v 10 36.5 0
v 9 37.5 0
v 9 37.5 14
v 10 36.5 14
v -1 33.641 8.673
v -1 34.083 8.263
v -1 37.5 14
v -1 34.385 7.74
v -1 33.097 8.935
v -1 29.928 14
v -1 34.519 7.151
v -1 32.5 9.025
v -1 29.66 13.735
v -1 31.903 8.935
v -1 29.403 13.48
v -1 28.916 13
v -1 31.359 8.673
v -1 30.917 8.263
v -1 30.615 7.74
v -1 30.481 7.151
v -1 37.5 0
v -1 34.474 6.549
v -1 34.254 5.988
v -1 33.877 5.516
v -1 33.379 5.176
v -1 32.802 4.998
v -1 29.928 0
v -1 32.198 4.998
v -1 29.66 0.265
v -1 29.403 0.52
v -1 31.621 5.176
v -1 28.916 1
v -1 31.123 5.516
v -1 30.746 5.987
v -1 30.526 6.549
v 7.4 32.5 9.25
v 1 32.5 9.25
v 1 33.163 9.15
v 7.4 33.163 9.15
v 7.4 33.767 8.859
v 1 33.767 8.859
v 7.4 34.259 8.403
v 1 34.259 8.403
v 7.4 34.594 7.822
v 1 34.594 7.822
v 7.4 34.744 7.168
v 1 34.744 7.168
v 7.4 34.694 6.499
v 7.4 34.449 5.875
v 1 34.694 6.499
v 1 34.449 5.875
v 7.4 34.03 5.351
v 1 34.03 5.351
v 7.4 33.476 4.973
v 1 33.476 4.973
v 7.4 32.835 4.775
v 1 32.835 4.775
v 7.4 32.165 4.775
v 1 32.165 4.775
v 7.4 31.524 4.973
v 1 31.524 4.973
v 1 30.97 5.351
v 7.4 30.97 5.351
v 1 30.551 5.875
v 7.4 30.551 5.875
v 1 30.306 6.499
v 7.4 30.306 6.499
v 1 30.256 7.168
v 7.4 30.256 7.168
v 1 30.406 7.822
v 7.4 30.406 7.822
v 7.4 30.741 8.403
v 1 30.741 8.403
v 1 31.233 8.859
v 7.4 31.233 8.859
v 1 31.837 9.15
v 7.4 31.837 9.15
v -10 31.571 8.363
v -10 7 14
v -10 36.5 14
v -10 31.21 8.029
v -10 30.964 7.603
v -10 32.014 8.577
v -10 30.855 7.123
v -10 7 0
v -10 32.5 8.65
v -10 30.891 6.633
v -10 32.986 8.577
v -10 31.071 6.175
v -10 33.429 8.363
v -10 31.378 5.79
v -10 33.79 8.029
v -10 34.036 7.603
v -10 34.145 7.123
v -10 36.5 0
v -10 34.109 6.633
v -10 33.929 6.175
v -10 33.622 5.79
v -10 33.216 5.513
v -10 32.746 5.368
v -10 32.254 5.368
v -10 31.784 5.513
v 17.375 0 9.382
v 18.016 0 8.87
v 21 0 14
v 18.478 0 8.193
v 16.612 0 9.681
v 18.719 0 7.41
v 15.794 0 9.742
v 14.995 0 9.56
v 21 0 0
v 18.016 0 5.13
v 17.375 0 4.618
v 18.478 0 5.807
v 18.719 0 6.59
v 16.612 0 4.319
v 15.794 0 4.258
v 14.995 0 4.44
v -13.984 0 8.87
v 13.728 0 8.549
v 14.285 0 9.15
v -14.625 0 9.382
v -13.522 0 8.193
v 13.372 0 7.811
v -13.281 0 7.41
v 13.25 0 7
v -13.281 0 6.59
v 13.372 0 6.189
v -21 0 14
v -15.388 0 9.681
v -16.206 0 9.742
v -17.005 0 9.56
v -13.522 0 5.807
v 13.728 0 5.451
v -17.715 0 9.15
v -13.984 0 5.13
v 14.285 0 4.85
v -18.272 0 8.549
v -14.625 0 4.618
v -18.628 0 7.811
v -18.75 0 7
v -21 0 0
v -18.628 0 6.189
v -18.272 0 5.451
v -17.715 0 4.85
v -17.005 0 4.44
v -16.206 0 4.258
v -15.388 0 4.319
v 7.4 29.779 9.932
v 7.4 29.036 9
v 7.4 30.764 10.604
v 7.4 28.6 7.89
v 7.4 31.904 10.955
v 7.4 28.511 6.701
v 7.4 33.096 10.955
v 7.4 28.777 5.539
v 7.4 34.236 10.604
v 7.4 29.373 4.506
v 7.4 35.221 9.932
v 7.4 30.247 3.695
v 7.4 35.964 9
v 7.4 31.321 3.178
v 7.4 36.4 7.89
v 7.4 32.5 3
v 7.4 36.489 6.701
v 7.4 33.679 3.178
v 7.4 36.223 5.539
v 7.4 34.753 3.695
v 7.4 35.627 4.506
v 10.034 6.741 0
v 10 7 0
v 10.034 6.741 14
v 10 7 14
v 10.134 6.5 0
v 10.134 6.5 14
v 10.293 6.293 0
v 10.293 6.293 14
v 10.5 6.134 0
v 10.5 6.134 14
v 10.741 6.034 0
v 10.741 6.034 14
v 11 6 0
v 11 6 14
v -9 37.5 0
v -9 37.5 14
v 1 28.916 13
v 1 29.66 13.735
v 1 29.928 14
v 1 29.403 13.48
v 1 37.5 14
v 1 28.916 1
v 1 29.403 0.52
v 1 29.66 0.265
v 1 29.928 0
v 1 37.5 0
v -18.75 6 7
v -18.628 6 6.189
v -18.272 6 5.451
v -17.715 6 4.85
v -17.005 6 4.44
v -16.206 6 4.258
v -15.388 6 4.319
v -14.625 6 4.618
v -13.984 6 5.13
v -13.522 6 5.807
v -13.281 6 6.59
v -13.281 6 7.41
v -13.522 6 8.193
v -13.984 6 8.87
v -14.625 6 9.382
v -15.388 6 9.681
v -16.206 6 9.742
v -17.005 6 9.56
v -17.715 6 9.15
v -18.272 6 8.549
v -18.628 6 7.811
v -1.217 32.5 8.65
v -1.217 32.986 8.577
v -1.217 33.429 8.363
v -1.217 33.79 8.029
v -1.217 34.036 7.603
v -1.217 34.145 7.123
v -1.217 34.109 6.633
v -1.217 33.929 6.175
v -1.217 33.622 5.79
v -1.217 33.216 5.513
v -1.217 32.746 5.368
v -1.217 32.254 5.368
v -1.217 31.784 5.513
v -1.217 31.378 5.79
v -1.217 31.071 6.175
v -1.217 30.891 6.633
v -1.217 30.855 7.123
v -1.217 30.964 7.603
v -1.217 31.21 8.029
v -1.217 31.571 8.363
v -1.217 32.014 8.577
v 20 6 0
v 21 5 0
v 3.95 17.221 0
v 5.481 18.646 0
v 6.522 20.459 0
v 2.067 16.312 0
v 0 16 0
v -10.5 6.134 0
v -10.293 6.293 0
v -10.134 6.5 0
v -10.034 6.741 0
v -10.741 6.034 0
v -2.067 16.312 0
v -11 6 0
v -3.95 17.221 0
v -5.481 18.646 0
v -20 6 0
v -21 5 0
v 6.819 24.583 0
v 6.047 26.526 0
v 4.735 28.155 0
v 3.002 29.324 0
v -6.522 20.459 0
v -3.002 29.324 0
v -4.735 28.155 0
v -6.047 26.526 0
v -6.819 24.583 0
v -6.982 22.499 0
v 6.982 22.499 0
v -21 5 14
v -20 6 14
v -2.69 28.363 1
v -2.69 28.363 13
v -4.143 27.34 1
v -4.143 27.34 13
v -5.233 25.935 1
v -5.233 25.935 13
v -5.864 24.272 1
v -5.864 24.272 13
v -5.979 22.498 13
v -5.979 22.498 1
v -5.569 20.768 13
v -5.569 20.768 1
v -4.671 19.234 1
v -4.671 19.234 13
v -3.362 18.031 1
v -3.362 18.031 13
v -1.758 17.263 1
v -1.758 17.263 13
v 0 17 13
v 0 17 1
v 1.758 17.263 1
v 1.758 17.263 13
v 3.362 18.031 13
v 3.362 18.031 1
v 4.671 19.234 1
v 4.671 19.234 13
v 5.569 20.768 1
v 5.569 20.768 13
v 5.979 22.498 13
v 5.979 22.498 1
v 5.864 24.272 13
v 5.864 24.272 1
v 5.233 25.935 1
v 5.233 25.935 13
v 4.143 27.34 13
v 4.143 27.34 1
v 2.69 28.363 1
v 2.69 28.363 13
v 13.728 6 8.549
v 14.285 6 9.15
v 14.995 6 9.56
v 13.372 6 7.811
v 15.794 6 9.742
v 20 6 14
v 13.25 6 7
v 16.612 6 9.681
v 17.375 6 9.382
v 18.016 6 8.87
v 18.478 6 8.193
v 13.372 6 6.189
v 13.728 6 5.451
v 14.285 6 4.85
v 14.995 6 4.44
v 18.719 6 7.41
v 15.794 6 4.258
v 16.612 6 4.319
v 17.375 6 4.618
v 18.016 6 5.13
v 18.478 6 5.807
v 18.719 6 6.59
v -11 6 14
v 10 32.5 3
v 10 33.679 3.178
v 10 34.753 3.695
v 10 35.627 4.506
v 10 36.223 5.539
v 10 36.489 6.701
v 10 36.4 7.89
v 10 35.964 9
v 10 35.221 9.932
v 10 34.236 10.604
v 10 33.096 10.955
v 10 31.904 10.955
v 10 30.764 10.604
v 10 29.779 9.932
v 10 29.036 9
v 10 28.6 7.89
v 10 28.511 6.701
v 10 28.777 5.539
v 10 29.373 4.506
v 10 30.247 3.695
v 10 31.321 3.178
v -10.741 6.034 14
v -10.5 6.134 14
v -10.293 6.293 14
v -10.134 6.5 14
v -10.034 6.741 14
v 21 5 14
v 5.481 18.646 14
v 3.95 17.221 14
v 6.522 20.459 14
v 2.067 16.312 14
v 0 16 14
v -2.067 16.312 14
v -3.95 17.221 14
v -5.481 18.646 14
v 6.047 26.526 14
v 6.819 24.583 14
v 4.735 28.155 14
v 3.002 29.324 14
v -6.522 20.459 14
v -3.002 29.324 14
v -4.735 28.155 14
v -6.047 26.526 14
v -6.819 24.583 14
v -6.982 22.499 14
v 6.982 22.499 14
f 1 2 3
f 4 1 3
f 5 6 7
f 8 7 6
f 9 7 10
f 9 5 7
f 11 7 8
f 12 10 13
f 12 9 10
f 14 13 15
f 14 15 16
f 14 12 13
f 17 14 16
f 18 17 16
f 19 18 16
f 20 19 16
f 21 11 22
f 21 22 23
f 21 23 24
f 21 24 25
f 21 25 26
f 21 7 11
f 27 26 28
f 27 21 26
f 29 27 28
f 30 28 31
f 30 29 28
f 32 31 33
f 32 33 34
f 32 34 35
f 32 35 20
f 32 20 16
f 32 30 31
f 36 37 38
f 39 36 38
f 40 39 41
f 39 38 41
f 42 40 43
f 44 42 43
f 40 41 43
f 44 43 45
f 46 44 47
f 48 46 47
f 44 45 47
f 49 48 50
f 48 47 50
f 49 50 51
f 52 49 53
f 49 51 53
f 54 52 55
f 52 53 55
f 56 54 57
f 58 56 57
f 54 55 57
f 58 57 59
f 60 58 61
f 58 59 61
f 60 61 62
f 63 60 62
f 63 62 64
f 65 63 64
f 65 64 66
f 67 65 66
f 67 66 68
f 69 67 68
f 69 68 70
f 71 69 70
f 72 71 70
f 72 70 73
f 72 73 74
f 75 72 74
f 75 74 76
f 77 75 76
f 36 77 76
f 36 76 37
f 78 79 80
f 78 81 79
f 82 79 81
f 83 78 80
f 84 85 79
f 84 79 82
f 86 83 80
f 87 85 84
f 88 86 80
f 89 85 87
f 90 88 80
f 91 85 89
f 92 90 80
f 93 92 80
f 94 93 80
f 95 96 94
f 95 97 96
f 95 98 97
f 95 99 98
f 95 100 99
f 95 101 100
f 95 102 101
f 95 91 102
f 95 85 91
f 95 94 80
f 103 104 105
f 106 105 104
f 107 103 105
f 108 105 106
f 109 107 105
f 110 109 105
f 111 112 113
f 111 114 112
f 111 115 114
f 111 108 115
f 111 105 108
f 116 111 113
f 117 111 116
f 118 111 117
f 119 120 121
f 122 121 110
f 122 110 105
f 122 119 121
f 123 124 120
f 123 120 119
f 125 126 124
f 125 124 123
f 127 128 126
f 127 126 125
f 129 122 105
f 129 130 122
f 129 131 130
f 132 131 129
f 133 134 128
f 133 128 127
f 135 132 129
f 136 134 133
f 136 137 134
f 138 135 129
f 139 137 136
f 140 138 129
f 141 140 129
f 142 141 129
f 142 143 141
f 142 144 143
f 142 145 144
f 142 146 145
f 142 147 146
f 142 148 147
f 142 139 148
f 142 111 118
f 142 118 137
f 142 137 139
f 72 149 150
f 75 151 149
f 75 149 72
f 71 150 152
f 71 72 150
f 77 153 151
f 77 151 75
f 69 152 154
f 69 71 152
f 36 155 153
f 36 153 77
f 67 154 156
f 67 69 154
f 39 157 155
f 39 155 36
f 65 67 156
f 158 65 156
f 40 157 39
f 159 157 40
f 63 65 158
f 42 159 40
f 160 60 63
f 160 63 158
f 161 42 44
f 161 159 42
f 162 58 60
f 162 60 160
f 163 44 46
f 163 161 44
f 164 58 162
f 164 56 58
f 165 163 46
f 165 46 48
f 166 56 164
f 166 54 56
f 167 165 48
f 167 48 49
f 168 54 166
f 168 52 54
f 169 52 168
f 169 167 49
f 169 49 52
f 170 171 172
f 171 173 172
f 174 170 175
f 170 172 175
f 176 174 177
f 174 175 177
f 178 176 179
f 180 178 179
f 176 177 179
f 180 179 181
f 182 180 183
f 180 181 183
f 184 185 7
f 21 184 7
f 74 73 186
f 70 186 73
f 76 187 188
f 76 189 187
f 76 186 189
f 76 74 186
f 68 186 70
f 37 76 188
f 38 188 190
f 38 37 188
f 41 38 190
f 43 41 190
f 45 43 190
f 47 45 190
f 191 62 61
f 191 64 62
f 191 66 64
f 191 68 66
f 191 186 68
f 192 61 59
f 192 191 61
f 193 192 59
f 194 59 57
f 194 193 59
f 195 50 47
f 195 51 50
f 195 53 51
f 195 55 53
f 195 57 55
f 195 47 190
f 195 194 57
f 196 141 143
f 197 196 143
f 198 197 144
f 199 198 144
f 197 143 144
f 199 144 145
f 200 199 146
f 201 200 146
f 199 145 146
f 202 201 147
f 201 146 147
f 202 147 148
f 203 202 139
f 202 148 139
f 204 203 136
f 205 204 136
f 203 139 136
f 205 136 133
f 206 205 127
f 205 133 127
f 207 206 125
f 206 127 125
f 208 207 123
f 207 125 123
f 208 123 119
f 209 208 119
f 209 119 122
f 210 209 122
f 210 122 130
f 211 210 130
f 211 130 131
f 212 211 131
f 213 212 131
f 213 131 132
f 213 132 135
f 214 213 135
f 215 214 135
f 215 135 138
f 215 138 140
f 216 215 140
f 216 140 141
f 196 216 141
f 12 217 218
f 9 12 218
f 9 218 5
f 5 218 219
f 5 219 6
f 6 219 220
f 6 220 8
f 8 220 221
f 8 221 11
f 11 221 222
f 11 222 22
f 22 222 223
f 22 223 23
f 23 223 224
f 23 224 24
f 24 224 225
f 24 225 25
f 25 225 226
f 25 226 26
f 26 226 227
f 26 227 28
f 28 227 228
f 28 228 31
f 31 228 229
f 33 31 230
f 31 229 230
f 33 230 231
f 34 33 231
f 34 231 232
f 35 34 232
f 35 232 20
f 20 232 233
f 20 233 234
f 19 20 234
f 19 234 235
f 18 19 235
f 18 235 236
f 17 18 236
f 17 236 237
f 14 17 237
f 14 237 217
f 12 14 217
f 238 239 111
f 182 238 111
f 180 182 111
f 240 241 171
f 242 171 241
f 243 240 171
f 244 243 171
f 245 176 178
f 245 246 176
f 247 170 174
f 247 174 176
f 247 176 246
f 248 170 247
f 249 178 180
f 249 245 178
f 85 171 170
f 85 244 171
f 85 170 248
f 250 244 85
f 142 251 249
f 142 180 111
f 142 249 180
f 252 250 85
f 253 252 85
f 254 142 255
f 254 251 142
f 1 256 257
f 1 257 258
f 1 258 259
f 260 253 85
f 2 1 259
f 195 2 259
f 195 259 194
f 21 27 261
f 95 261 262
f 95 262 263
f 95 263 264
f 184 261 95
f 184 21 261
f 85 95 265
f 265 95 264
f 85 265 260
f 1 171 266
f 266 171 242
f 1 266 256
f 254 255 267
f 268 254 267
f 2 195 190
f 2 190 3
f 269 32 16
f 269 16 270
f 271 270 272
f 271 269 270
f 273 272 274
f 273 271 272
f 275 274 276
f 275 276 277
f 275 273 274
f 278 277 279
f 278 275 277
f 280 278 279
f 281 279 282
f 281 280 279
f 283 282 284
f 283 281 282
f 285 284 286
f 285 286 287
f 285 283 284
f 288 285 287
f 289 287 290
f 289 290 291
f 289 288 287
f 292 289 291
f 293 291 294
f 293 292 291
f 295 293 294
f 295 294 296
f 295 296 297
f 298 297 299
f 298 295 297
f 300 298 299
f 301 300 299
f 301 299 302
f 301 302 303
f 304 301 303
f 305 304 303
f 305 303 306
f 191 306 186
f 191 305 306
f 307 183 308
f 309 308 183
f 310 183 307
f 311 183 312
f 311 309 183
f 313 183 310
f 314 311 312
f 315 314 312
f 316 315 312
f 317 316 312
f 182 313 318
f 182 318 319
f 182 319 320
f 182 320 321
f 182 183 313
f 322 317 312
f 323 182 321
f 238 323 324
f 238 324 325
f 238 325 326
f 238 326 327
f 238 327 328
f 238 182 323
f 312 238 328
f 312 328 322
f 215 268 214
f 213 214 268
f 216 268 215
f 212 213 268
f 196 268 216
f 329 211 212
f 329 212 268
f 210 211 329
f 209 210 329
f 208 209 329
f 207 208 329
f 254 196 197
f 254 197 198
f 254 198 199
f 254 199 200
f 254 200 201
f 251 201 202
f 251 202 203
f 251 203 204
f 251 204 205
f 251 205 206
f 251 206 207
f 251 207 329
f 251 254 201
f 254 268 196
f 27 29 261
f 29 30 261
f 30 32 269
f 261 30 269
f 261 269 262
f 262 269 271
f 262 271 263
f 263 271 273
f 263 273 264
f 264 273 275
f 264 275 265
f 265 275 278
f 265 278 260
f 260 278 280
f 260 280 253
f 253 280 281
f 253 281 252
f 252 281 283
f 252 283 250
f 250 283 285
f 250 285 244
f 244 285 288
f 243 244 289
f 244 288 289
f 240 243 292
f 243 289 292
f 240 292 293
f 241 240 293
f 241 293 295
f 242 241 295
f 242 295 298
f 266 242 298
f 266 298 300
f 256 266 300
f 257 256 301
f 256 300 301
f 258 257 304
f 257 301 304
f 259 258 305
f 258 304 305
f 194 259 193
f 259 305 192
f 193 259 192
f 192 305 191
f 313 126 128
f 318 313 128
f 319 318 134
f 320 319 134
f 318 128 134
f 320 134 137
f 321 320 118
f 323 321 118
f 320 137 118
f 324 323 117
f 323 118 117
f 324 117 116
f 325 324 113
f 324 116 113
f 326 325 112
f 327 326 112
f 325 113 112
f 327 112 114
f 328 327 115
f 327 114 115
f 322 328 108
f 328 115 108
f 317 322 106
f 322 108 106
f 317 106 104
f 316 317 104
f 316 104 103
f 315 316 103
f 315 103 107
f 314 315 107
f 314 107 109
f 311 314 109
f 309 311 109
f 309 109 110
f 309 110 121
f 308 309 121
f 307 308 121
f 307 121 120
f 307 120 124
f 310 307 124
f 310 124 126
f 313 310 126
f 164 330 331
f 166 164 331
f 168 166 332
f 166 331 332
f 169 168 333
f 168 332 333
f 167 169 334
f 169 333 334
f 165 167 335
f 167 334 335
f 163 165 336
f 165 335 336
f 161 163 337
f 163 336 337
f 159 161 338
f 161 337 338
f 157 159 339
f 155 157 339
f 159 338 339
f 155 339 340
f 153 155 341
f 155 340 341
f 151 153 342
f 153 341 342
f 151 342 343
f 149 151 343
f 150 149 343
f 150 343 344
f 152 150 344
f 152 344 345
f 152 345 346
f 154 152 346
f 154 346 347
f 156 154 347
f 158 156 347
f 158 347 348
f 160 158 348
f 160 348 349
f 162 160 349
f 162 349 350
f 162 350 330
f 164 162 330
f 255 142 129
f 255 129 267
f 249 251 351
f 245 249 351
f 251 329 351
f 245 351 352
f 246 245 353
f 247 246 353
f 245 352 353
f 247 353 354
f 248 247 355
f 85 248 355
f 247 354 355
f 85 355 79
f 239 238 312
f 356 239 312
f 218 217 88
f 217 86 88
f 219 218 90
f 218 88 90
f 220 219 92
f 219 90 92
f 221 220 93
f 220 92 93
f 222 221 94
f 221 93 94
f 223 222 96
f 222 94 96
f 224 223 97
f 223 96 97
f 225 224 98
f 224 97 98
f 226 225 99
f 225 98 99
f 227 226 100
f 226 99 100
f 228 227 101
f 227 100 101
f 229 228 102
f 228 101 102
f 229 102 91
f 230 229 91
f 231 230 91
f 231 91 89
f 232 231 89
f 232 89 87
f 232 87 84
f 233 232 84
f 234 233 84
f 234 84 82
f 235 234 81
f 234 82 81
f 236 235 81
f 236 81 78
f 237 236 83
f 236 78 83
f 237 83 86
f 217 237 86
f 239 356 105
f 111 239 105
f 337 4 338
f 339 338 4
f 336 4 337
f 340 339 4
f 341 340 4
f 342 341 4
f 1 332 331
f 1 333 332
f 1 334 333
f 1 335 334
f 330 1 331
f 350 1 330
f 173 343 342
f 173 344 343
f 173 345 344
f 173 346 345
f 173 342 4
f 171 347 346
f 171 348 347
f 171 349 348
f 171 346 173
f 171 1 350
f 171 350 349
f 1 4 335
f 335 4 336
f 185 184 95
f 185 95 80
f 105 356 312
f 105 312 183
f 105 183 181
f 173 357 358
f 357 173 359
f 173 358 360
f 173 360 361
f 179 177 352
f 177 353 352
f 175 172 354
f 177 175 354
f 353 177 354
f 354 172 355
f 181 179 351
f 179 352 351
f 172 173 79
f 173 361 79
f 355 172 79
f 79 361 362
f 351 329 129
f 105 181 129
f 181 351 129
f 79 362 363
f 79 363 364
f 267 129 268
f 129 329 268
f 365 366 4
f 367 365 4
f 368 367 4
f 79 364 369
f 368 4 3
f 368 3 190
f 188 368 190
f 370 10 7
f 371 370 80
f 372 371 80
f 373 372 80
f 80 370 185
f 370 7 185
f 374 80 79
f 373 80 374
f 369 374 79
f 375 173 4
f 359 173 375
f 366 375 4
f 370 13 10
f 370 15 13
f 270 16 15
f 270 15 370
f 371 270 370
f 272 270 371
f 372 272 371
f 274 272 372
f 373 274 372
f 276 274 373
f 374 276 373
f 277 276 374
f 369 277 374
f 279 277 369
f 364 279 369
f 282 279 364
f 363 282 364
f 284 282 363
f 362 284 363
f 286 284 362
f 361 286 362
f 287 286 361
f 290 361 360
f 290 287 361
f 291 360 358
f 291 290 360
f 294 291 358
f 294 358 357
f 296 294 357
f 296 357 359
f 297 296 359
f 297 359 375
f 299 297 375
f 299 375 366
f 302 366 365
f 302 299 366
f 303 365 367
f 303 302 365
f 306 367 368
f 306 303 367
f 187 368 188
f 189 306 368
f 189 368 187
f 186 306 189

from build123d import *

# Parameters (mm, degrees)
ESTRUSIONE_ESTRUSIONE2_DEPTH                         = 14
FORO_5_5_5_5_3_D                                     = 5.5
FORO_LAMATO_PER_VITE_M4_A_TESTA_CILINDRI_D           = 4.5
FORO_LAMATO_PER_VITE_M4_A_TESTA_CILINDRI_DEPTH       = 9
FORO_LAMATO_PER_VITE_M4_A_TESTA_CILINDRI_CBORE_D     = 8
FORO_LAMATO_PER_VITE_M4_A_TESTA_CILINDRI_CBORE_DEPTH = 2.6
FORO_FILETTATO_M4_1_D                                = 3.3
FORO_FILETTATO_M4_1_CSINK_D                          = 4.05
FORO_FILETTATO_M4_1_CSINK_ANGLE                      = 120
RACCORDO1_R                                          = 1
SMUSSO1_SIZE                                         = 1


with BuildPart() as part:
    # Schizzo10 → Estrusione-Estrusione2 (new body)
    with BuildSketch(Plane.XY):
        with BuildLine():
            Line((21, 0), (-21, 0))
            Line((-21, 0), (-21, 6))
            Line((-21, 6), (-10, 6))
            Line((-10, 6), (-10, 37.5))
            Line((-10, 37.5), (-1, 37.5))
            Line((-1, 37.5), (-1, 28.916079783))
            ThreePointArc((-1, 28.916079783), (0, 17), (1, 28.916079783))
            Line((1, 28.916079783), (1, 37.5))
            Line((1, 37.5), (10, 37.5))
            Line((10, 37.5), (10, 6))
            Line((10, 6), (21, 6))
            Line((21, 6), (21, 0))
        make_face()
    extrude(amount=ESTRUSIONE_ESTRUSIONE2_DEPTH)

    # Foro Ø5.5 (5.5)-3 (through all)
    with Locations(Plane(origin=(0, 6, 0), x_dir=(1, 0, 0), z_dir=(0, 1, 0))):
        with Locations((-16, -7), (16, -7)):
            Hole(FORO_5_5_5_5_3_D / 2)

    # Foro lamato per Vite M4 a testa cilindrica piana-1
    with Locations(Plane(origin=(10, 0, 0), x_dir=(0, 0, -1), z_dir=(1, 0, 0))):
        with Locations((-7, 32.5)):
            CounterBoreHole(FORO_LAMATO_PER_VITE_M4_A_TESTA_CILINDRI_D / 2, FORO_LAMATO_PER_VITE_M4_A_TESTA_CILINDRI_CBORE_D / 2, FORO_LAMATO_PER_VITE_M4_A_TESTA_CILINDRI_CBORE_DEPTH, depth=FORO_LAMATO_PER_VITE_M4_A_TESTA_CILINDRI_DEPTH)

    # Foro filettato M4-1 (through all)
    with Locations(Plane(origin=(-1, 0, 0), x_dir=(0, 0, -1), z_dir=(1, 0, 0))):
        with Locations((-7, 32.5)):
            CounterSinkHole(FORO_FILETTATO_M4_1_D / 2, FORO_FILETTATO_M4_1_CSINK_D / 2, counter_sink_angle=FORO_FILETTATO_M4_1_CSINK_ANGLE)

    # Raccordo1
    raccordo1_edges = [part.edges().sort_by_distance(p)[0] for p in [
        (10, 6, 7),
        (-10, 6, 7),
    ]]
    fillet(raccordo1_edges, radius=RACCORDO1_R)

    # Smusso1
    smusso1_edges = [part.edges().sort_by_distance(p)[0] for p in [
        (0, 17, 0),
        (10, 37.5, 7),
        (21, 6, 7),
        (-21, 6, 7),
        (-10, 37.5, 7),
        (0, 17, 14),
    ]]
    chamfer(smusso1_edges, length=SMUSSO1_SIZE - 0.0001)  # a hair under: the kernel refuses the full size


solid = part.part
